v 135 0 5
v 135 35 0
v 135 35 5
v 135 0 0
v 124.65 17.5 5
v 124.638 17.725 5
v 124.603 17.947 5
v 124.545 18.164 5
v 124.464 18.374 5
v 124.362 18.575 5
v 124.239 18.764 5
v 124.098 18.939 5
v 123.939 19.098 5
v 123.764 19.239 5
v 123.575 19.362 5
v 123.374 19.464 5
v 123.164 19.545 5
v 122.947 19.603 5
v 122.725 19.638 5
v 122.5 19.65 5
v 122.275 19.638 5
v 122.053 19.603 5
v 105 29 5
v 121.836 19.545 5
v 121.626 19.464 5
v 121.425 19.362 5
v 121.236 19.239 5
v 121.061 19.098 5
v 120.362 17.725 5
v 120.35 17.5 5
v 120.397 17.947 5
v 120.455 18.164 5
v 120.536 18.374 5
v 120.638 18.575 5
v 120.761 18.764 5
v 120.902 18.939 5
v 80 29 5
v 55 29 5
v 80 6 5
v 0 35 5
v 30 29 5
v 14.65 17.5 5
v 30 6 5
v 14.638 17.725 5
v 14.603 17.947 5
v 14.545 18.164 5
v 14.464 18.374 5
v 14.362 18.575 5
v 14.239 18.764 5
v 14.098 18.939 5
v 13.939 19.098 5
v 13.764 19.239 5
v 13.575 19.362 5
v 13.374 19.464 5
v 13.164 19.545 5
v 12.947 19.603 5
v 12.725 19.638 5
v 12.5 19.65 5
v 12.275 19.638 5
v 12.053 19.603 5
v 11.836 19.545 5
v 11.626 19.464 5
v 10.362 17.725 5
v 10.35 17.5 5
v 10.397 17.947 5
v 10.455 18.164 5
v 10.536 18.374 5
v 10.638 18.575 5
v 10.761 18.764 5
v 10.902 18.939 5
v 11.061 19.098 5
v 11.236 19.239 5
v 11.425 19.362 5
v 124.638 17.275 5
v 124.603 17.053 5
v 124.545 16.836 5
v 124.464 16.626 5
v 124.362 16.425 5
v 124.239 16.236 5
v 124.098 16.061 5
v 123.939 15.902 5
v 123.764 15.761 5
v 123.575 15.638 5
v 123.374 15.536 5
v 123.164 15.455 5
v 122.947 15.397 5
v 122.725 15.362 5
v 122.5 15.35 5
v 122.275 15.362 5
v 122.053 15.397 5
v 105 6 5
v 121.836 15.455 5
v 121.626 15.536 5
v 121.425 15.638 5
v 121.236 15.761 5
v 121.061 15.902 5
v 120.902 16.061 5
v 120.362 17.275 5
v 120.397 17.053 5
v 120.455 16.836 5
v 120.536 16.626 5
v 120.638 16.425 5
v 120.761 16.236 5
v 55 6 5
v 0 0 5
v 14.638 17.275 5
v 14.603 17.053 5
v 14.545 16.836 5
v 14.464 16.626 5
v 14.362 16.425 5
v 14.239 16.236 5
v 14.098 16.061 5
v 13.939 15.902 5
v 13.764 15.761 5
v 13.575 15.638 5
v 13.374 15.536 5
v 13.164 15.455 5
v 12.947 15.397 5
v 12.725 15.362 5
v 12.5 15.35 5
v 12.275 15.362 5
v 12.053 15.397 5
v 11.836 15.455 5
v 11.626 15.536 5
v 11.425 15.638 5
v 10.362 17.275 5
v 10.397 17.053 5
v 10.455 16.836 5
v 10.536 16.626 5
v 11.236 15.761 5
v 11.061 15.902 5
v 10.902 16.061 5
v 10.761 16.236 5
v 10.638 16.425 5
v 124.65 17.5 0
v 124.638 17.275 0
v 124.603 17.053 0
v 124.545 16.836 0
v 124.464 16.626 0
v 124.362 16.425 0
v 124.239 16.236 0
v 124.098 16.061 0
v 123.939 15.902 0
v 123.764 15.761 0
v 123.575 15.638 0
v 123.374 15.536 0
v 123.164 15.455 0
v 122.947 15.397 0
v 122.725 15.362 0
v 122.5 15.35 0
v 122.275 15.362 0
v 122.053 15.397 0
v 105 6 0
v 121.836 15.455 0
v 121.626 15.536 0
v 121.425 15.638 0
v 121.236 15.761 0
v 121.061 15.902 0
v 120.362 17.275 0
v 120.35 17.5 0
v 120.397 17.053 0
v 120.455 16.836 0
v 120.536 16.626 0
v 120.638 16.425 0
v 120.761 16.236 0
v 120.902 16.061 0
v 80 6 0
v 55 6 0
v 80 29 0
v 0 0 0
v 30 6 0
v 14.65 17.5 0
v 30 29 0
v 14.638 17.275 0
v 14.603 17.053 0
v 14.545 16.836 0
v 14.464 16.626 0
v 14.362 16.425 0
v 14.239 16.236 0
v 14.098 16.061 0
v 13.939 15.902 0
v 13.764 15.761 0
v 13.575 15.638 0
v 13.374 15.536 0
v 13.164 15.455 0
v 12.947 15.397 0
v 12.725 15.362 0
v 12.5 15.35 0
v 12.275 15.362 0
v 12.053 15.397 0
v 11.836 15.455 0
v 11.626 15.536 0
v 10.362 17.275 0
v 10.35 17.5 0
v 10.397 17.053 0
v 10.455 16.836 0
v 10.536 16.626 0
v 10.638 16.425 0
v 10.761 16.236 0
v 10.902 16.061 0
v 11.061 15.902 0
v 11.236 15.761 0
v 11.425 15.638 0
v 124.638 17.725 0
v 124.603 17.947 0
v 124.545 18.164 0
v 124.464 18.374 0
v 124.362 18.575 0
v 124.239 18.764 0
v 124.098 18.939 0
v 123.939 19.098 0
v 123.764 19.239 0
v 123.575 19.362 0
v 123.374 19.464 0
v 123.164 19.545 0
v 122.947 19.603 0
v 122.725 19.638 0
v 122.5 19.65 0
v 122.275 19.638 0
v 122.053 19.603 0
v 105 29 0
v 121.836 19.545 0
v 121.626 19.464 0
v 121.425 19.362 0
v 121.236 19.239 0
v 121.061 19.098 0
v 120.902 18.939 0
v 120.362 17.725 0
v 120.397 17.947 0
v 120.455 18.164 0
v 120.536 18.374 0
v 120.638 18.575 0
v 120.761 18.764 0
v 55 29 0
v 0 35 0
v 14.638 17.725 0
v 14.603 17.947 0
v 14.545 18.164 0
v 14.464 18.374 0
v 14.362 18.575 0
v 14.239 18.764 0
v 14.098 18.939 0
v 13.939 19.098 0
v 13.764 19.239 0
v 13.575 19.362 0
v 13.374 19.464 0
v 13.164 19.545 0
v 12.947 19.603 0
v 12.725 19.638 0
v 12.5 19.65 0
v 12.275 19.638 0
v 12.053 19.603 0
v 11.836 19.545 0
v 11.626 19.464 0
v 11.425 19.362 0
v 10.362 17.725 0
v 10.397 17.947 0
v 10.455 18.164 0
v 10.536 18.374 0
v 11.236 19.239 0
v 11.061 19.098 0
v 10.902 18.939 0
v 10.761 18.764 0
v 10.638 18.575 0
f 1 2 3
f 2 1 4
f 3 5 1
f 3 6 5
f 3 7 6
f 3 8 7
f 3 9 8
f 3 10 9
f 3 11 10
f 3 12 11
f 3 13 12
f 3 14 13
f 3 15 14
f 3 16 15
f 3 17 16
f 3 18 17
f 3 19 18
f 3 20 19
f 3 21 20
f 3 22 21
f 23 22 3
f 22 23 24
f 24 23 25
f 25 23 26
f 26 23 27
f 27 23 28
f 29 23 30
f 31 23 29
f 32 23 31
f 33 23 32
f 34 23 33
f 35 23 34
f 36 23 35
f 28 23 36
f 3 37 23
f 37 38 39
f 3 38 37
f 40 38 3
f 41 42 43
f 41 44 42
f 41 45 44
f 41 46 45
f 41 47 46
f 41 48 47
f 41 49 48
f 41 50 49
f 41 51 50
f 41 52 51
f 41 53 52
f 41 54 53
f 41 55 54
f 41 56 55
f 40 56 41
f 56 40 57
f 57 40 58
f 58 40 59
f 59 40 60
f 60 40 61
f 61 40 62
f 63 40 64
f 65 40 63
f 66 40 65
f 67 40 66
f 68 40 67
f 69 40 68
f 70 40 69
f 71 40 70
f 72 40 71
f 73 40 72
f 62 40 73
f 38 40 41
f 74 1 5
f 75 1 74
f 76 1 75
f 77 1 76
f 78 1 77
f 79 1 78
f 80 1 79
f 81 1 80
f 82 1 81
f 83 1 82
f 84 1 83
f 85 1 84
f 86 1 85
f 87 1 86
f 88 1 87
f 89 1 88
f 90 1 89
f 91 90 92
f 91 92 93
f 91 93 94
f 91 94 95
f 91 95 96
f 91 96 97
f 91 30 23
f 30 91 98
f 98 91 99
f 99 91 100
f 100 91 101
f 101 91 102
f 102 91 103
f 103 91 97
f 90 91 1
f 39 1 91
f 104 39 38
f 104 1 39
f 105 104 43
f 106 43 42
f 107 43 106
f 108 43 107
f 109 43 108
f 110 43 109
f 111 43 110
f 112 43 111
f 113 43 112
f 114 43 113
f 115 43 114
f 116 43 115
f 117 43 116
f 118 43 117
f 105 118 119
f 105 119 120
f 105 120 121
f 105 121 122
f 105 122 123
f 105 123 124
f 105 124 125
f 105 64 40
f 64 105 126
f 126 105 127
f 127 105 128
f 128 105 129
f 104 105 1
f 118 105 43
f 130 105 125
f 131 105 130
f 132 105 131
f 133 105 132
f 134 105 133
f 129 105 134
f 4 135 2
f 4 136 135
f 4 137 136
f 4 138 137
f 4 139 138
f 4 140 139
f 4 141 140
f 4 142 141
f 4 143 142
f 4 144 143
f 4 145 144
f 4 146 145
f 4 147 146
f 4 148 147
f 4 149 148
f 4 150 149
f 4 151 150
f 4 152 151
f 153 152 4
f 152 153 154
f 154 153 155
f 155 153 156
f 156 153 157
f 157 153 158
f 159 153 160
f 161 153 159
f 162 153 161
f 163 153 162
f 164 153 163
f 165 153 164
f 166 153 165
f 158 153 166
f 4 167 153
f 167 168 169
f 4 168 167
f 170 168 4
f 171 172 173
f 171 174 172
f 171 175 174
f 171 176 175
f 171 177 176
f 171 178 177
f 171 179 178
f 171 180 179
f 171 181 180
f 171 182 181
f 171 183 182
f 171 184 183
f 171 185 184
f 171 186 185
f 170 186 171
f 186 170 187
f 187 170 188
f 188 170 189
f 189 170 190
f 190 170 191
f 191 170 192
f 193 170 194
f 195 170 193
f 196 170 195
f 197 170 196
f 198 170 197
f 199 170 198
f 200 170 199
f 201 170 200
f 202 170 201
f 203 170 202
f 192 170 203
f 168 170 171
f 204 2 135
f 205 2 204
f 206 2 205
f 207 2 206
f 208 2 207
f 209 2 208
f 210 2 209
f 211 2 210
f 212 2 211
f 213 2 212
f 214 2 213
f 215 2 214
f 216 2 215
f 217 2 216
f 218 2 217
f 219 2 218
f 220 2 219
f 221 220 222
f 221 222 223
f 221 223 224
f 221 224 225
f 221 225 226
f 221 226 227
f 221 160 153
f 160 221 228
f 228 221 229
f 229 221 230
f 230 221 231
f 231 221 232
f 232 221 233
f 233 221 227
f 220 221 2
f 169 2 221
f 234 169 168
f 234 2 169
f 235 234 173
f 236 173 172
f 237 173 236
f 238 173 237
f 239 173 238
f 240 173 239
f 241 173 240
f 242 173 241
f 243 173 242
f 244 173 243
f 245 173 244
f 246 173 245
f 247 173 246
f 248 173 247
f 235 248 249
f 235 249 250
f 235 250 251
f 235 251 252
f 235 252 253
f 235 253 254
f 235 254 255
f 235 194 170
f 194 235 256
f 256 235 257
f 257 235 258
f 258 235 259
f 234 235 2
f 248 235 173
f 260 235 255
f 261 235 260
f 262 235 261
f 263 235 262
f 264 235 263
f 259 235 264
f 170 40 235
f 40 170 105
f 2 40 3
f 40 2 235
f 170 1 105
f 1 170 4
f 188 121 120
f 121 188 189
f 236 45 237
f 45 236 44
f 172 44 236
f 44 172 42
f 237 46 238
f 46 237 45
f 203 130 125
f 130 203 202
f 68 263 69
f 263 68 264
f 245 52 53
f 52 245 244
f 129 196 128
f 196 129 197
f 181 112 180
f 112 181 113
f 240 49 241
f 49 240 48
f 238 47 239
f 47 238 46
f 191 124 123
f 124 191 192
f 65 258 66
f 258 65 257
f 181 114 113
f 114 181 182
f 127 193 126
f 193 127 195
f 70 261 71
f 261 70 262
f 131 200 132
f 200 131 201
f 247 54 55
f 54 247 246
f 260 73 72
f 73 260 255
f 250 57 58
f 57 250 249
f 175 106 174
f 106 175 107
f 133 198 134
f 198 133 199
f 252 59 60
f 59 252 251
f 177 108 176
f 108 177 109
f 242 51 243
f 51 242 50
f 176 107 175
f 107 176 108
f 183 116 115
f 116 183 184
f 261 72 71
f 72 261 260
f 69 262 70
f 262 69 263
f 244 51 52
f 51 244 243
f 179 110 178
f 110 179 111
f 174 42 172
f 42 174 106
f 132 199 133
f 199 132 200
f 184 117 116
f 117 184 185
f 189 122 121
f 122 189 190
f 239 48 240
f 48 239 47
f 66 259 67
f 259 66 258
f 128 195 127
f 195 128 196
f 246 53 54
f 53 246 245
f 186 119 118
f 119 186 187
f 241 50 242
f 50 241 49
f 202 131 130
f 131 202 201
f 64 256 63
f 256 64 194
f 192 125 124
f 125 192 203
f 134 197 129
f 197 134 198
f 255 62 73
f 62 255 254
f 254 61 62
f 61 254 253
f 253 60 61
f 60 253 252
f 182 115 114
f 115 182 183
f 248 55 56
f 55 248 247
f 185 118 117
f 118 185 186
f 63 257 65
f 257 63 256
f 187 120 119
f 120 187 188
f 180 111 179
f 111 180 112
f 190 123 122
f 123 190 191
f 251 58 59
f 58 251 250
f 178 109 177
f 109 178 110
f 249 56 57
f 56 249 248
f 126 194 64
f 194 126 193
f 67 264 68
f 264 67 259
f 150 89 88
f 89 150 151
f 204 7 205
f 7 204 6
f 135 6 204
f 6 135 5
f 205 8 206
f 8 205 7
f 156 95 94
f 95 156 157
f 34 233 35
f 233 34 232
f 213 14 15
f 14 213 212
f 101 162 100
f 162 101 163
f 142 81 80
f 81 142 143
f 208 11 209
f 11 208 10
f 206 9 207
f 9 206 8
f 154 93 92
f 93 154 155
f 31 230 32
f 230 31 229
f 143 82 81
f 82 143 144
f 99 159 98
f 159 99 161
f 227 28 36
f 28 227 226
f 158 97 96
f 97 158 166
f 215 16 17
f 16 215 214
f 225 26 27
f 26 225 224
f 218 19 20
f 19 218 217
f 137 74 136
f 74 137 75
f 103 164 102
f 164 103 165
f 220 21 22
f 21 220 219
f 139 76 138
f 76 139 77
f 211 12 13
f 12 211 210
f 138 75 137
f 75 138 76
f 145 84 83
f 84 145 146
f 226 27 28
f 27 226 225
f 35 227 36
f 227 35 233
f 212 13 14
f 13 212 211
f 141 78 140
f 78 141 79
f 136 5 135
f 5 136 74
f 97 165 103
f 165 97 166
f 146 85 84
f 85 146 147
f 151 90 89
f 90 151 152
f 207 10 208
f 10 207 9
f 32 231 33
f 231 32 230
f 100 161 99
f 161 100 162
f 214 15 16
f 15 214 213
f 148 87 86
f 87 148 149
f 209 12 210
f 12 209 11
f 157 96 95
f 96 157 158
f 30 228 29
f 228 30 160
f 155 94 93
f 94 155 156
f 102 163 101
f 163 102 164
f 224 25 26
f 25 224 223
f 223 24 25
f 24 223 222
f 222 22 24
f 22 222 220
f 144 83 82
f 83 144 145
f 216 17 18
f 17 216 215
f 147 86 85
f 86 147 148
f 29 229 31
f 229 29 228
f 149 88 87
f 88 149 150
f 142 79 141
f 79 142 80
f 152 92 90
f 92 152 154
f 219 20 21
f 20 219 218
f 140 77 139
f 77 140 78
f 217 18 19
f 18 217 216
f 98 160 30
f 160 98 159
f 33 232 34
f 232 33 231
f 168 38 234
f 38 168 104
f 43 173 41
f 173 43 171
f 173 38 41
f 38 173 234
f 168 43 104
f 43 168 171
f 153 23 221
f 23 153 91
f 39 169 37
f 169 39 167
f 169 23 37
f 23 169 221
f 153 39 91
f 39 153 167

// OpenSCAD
// Sıfır Atık YZ - 5 Kanallı Pnömatik Solenoid Manifold Montaj Braketi
// 2020 Alüminyum Sigma Profile ve standart 1/4" 5'li manifold bloğuna uyumludur.
// OpenSCAD ile düzenlenebilir veya STL formatına ihraç edilip 3D yazıcıdan basılabilir.

$fn = 60;

manifold_width = 35;
manifold_length = 135;
thickness = 5;

module manifold_bracket() {
    difference() {
        cube([manifold_length, manifold_width, thickness]);

        // Manifold sabitleme delikleri (M4 Cıvata, 110mm aralık)
        translate([12.5, manifold_width/2, -1])
            cylinder(h = thickness + 2, d = 4.3);
        translate([manifold_length - 12.5, manifold_width/2, -1])
            cylinder(h = thickness + 2, d = 4.3);

        // 2020 Sigma Profil Montaj Slotları (M4 T-Nut)
        translate([manifold_length/2 - 20, manifold_width/2, -1])
            cylinder(h = thickness + 2, d = 4.5);
        translate([manifold_length/2 + 20, manifold_width/2, -1])
            cylinder(h = thickness + 2, d = 4.5);
            
        // Ağırlık azaltma cepleri
        translate([30, 6, -1])
            cube([25, manifold_width - 12, thickness + 2]);
        translate([80, 6, -1])
            cube([25, manifold_width - 12, thickness + 2]);
    }
}

manifold_bracket();
